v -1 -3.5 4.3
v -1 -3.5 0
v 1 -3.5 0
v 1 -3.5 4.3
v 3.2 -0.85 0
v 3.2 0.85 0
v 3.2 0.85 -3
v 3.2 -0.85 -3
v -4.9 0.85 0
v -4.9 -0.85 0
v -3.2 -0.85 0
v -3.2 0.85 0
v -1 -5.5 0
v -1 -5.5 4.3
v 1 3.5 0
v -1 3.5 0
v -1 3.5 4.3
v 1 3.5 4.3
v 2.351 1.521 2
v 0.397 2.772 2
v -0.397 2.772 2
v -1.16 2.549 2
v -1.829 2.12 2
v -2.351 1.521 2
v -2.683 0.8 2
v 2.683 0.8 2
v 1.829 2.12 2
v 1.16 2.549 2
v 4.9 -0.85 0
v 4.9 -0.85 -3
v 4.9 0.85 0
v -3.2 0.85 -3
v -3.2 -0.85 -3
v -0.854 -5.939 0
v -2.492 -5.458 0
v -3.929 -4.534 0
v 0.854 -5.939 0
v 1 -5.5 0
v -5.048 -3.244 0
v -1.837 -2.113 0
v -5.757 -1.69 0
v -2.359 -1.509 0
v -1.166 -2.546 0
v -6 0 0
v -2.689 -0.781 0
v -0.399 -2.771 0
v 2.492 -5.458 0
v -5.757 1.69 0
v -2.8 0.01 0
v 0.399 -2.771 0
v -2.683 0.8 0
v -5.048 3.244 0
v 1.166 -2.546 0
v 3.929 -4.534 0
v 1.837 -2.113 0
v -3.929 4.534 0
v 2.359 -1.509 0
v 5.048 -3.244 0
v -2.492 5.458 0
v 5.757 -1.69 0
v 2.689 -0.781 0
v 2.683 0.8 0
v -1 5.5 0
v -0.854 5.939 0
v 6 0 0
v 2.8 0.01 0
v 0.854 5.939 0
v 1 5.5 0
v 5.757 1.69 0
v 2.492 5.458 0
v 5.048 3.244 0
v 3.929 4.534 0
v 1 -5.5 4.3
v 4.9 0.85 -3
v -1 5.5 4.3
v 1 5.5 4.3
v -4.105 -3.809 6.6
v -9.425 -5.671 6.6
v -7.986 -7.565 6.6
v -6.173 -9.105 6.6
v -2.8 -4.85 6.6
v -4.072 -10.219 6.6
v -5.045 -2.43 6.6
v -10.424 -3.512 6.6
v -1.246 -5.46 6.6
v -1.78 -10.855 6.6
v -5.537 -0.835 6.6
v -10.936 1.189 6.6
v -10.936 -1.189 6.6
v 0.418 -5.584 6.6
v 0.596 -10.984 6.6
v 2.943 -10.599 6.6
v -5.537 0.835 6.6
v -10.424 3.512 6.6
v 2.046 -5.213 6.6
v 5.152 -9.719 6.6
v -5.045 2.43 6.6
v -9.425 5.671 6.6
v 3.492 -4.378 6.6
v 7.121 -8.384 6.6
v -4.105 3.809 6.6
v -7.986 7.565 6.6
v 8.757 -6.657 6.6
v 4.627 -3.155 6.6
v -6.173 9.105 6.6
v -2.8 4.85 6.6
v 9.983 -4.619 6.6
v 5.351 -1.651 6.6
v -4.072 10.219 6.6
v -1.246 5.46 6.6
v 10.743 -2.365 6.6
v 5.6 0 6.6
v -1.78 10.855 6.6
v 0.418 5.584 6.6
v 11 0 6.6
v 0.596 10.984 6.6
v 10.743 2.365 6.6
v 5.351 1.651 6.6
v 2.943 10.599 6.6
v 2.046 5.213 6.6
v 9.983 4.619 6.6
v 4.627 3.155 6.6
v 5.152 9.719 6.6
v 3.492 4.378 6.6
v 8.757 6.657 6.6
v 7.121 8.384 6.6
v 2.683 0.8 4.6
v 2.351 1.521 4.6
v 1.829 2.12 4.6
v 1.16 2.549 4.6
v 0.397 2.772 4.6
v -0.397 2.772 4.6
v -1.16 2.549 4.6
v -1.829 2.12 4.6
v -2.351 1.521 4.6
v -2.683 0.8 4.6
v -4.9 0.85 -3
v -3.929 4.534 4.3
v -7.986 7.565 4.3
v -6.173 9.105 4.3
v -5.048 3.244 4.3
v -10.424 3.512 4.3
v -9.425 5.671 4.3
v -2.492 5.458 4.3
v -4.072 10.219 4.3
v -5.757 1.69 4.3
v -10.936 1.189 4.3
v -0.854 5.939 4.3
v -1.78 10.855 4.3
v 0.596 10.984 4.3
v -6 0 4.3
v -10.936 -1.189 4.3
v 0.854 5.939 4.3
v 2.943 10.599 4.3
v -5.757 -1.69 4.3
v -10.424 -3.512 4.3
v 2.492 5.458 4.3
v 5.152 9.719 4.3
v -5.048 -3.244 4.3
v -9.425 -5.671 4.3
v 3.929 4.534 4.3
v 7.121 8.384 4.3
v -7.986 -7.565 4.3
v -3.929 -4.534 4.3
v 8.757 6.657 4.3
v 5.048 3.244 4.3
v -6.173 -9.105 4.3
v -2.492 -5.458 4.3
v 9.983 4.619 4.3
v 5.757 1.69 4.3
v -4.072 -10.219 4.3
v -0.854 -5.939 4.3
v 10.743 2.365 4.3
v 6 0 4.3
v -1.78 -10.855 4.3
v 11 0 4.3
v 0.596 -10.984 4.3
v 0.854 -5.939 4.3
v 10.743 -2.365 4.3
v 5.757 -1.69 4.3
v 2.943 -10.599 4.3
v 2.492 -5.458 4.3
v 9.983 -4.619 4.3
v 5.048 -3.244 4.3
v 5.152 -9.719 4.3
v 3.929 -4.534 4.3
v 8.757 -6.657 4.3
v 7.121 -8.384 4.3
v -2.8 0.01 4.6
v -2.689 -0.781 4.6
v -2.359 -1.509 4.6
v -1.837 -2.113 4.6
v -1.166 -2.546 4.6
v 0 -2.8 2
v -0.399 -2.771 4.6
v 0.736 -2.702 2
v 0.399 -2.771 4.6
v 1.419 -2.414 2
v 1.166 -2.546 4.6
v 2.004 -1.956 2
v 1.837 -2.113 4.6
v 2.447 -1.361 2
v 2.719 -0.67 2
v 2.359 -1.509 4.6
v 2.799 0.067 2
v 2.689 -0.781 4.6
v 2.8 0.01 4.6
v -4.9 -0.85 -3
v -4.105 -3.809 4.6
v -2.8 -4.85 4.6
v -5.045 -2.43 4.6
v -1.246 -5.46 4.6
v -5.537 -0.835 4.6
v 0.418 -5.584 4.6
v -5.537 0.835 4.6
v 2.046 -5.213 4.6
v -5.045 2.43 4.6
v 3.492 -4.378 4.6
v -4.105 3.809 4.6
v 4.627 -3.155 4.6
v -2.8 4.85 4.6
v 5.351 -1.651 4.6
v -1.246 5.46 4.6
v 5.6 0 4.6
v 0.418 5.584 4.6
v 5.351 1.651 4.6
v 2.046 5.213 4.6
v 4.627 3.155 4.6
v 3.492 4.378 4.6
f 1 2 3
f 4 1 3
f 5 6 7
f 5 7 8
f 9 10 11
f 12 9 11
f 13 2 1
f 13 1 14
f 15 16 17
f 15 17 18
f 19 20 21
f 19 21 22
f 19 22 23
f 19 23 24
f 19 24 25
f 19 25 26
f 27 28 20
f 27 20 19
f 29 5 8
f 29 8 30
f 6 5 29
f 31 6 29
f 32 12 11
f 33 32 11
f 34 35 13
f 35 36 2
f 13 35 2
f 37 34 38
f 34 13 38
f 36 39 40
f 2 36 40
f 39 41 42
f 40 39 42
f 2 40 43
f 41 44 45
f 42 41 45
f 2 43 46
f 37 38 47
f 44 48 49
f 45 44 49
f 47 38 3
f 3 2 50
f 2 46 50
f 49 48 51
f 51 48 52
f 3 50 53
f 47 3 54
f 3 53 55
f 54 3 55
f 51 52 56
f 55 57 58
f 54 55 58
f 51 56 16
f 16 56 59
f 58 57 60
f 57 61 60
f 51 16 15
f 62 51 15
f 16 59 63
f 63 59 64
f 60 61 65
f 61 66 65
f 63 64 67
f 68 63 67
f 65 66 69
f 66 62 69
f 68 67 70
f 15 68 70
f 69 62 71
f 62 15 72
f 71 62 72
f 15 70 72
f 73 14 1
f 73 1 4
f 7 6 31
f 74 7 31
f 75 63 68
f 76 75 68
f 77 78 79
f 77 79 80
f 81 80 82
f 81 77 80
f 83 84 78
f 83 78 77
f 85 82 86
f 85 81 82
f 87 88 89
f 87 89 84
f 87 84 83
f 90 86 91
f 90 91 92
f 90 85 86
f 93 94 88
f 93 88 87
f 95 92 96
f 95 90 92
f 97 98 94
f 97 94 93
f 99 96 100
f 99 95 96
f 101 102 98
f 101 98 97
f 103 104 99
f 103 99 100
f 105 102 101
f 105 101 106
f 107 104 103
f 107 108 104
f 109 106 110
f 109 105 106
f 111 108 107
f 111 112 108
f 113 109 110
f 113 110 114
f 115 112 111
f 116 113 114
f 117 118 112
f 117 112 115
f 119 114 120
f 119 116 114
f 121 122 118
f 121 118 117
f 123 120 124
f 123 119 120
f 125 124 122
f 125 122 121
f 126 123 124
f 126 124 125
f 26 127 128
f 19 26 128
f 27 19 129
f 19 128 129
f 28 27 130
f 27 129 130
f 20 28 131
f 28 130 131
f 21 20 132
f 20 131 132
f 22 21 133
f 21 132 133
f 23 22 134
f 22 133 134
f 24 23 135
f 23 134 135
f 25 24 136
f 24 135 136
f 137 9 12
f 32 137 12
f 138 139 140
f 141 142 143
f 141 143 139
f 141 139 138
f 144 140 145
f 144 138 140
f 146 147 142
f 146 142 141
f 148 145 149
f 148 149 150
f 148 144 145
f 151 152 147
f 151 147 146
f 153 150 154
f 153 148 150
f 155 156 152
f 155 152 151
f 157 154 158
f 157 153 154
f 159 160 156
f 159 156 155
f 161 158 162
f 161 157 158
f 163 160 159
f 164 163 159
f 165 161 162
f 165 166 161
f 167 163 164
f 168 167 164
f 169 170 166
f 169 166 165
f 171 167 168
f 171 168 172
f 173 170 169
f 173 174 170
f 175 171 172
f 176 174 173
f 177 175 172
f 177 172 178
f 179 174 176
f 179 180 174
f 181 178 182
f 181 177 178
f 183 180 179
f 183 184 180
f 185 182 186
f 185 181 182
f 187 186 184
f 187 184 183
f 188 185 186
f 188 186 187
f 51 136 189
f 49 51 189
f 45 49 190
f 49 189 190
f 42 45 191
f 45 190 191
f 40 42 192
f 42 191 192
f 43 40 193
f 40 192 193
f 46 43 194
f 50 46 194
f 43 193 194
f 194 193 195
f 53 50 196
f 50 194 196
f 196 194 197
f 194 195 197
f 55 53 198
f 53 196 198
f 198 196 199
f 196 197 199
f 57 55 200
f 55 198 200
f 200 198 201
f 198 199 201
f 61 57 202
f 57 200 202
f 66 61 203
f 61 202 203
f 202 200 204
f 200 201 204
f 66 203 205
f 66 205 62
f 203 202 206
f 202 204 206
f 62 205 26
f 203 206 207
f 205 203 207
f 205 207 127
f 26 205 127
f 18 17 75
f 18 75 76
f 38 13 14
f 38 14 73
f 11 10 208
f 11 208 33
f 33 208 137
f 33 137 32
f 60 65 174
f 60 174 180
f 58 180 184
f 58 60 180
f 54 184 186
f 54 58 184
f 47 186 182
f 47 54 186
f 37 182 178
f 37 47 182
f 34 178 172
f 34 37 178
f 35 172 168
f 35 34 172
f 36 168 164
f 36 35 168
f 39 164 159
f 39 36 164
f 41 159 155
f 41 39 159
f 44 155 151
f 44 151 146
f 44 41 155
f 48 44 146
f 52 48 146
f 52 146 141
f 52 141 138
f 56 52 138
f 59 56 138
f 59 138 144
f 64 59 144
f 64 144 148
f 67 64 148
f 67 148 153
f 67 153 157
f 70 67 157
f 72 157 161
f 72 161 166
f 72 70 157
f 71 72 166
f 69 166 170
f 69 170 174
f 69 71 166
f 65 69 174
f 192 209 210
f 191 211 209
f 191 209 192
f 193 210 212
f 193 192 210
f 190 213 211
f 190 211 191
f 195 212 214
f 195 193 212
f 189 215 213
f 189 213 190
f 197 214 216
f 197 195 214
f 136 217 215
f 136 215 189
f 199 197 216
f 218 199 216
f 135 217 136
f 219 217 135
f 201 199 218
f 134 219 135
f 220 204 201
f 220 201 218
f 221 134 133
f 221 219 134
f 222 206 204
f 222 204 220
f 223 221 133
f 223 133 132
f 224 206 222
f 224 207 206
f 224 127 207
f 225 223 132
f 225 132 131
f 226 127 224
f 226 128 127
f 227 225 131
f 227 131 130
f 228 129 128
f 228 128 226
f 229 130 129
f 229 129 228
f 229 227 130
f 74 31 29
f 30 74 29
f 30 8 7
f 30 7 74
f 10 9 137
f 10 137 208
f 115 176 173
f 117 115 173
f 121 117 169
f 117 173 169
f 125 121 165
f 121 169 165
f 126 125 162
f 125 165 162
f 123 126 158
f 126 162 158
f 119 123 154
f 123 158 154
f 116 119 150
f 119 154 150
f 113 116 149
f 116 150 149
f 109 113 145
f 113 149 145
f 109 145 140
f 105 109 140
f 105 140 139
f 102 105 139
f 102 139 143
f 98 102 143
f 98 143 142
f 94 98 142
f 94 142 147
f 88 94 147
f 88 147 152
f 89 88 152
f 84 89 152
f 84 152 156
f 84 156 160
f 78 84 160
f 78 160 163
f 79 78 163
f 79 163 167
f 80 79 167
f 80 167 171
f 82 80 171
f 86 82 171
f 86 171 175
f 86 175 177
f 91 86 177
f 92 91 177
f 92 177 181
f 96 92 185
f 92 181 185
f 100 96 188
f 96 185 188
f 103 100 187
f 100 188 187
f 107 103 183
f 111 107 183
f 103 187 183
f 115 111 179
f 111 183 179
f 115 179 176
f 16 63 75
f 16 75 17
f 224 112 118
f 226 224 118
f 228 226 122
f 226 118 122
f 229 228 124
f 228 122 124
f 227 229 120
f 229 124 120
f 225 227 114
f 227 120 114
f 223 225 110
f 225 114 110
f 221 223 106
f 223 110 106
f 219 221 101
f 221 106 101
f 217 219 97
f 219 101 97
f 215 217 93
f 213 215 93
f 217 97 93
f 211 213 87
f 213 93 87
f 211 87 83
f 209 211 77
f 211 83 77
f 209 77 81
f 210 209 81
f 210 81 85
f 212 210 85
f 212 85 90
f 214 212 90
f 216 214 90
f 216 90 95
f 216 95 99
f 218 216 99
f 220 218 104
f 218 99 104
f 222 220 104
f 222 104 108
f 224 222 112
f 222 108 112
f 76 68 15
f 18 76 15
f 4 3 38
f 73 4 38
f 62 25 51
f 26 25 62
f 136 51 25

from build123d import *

# Parameters (mm, degrees)
SKETCH004_W     = 1.7
SKETCH004_H     = 1.7
PAD001_DEPTH    = 3
SKETCH_R        = 11
PAD_DEPTH       = 6.6
SKETCH001_R     = 11
SKETCH001_R_2   = 6
POCKET_DEPTH    = 4.3
POCKET001_DEPTH = 6.601
SKETCH003_W     = 2
SKETCH003_H     = 2
POCKET002_DEPTH = 4.3
SKETCH005_R     = 2.8
POCKET003_DEPTH = 4.6
SKETCH006_R     = 5.6
POCKET004_DEPTH = 2


with BuildPart() as pad001:
    # Sketch004 → Pad001 (new body)
    with BuildSketch(Plane(origin=(0, 0, 0), x_dir=(1, 0, 0), z_dir=(0, 0, -1))):
        with Locations((-4.05, 0)):
            Rectangle(SKETCH004_W, SKETCH004_H)
        with Locations((4.05, 0)):
            Rectangle(SKETCH004_W, SKETCH004_H)
    extrude(amount=PAD001_DEPTH)


with BuildPart() as pocket004:
    # Sketch → Pad (new body)
    with BuildSketch(Plane.XY):
        Circle(SKETCH_R)
    extrude(amount=PAD_DEPTH)

    # Sketch001 → Pocket (cut)
    with BuildSketch(Plane(origin=(0, 0, 0), x_dir=(1, 0, 0), z_dir=(0, 0, -1))):
        Circle(SKETCH001_R)
        Circle(SKETCH001_R_2, mode=Mode.SUBTRACT)
    extrude(amount=-POCKET_DEPTH, mode=Mode.SUBTRACT)

    # Sketch002 → Pocket001 (cut, through all)
    with BuildSketch(Plane.XY.offset(6.6)):
        with BuildLine():
            Line((-2.683282, 0.8), (2.683282, 0.8))
            ThreePointArc((-2.683282, 0.8), (0, -2.8), (2.683282, 0.8))
        make_face()
    extrude(amount=-POCKET001_DEPTH, mode=Mode.SUBTRACT)

    # Sketch003 → Pocket002 (cut)
    with BuildSketch(Plane(origin=(0, 0, 0), x_dir=(1, 0, 0), z_dir=(0, 0, -1))):
        with Locations((0, 4.5)):
            Rectangle(SKETCH003_W, SKETCH003_H)
        with Locations((0, -4.5)):
            Rectangle(SKETCH003_W, SKETCH003_H)
    extrude(amount=-POCKET002_DEPTH, mode=Mode.SUBTRACT)

    # Sketch005 → Pocket003 (cut)
    with BuildSketch(Plane.XY.offset(6.6)):
        Circle(SKETCH005_R)
    extrude(amount=-POCKET003_DEPTH, mode=Mode.SUBTRACT)

    # Sketch006 → Pocket004 (cut)
    with BuildSketch(Plane.XY.offset(6.6)):
        Circle(SKETCH006_R)
    extrude(amount=-POCKET004_DEPTH, mode=Mode.SUBTRACT)


solid = Compound([pad001.part, pocket004.part])
